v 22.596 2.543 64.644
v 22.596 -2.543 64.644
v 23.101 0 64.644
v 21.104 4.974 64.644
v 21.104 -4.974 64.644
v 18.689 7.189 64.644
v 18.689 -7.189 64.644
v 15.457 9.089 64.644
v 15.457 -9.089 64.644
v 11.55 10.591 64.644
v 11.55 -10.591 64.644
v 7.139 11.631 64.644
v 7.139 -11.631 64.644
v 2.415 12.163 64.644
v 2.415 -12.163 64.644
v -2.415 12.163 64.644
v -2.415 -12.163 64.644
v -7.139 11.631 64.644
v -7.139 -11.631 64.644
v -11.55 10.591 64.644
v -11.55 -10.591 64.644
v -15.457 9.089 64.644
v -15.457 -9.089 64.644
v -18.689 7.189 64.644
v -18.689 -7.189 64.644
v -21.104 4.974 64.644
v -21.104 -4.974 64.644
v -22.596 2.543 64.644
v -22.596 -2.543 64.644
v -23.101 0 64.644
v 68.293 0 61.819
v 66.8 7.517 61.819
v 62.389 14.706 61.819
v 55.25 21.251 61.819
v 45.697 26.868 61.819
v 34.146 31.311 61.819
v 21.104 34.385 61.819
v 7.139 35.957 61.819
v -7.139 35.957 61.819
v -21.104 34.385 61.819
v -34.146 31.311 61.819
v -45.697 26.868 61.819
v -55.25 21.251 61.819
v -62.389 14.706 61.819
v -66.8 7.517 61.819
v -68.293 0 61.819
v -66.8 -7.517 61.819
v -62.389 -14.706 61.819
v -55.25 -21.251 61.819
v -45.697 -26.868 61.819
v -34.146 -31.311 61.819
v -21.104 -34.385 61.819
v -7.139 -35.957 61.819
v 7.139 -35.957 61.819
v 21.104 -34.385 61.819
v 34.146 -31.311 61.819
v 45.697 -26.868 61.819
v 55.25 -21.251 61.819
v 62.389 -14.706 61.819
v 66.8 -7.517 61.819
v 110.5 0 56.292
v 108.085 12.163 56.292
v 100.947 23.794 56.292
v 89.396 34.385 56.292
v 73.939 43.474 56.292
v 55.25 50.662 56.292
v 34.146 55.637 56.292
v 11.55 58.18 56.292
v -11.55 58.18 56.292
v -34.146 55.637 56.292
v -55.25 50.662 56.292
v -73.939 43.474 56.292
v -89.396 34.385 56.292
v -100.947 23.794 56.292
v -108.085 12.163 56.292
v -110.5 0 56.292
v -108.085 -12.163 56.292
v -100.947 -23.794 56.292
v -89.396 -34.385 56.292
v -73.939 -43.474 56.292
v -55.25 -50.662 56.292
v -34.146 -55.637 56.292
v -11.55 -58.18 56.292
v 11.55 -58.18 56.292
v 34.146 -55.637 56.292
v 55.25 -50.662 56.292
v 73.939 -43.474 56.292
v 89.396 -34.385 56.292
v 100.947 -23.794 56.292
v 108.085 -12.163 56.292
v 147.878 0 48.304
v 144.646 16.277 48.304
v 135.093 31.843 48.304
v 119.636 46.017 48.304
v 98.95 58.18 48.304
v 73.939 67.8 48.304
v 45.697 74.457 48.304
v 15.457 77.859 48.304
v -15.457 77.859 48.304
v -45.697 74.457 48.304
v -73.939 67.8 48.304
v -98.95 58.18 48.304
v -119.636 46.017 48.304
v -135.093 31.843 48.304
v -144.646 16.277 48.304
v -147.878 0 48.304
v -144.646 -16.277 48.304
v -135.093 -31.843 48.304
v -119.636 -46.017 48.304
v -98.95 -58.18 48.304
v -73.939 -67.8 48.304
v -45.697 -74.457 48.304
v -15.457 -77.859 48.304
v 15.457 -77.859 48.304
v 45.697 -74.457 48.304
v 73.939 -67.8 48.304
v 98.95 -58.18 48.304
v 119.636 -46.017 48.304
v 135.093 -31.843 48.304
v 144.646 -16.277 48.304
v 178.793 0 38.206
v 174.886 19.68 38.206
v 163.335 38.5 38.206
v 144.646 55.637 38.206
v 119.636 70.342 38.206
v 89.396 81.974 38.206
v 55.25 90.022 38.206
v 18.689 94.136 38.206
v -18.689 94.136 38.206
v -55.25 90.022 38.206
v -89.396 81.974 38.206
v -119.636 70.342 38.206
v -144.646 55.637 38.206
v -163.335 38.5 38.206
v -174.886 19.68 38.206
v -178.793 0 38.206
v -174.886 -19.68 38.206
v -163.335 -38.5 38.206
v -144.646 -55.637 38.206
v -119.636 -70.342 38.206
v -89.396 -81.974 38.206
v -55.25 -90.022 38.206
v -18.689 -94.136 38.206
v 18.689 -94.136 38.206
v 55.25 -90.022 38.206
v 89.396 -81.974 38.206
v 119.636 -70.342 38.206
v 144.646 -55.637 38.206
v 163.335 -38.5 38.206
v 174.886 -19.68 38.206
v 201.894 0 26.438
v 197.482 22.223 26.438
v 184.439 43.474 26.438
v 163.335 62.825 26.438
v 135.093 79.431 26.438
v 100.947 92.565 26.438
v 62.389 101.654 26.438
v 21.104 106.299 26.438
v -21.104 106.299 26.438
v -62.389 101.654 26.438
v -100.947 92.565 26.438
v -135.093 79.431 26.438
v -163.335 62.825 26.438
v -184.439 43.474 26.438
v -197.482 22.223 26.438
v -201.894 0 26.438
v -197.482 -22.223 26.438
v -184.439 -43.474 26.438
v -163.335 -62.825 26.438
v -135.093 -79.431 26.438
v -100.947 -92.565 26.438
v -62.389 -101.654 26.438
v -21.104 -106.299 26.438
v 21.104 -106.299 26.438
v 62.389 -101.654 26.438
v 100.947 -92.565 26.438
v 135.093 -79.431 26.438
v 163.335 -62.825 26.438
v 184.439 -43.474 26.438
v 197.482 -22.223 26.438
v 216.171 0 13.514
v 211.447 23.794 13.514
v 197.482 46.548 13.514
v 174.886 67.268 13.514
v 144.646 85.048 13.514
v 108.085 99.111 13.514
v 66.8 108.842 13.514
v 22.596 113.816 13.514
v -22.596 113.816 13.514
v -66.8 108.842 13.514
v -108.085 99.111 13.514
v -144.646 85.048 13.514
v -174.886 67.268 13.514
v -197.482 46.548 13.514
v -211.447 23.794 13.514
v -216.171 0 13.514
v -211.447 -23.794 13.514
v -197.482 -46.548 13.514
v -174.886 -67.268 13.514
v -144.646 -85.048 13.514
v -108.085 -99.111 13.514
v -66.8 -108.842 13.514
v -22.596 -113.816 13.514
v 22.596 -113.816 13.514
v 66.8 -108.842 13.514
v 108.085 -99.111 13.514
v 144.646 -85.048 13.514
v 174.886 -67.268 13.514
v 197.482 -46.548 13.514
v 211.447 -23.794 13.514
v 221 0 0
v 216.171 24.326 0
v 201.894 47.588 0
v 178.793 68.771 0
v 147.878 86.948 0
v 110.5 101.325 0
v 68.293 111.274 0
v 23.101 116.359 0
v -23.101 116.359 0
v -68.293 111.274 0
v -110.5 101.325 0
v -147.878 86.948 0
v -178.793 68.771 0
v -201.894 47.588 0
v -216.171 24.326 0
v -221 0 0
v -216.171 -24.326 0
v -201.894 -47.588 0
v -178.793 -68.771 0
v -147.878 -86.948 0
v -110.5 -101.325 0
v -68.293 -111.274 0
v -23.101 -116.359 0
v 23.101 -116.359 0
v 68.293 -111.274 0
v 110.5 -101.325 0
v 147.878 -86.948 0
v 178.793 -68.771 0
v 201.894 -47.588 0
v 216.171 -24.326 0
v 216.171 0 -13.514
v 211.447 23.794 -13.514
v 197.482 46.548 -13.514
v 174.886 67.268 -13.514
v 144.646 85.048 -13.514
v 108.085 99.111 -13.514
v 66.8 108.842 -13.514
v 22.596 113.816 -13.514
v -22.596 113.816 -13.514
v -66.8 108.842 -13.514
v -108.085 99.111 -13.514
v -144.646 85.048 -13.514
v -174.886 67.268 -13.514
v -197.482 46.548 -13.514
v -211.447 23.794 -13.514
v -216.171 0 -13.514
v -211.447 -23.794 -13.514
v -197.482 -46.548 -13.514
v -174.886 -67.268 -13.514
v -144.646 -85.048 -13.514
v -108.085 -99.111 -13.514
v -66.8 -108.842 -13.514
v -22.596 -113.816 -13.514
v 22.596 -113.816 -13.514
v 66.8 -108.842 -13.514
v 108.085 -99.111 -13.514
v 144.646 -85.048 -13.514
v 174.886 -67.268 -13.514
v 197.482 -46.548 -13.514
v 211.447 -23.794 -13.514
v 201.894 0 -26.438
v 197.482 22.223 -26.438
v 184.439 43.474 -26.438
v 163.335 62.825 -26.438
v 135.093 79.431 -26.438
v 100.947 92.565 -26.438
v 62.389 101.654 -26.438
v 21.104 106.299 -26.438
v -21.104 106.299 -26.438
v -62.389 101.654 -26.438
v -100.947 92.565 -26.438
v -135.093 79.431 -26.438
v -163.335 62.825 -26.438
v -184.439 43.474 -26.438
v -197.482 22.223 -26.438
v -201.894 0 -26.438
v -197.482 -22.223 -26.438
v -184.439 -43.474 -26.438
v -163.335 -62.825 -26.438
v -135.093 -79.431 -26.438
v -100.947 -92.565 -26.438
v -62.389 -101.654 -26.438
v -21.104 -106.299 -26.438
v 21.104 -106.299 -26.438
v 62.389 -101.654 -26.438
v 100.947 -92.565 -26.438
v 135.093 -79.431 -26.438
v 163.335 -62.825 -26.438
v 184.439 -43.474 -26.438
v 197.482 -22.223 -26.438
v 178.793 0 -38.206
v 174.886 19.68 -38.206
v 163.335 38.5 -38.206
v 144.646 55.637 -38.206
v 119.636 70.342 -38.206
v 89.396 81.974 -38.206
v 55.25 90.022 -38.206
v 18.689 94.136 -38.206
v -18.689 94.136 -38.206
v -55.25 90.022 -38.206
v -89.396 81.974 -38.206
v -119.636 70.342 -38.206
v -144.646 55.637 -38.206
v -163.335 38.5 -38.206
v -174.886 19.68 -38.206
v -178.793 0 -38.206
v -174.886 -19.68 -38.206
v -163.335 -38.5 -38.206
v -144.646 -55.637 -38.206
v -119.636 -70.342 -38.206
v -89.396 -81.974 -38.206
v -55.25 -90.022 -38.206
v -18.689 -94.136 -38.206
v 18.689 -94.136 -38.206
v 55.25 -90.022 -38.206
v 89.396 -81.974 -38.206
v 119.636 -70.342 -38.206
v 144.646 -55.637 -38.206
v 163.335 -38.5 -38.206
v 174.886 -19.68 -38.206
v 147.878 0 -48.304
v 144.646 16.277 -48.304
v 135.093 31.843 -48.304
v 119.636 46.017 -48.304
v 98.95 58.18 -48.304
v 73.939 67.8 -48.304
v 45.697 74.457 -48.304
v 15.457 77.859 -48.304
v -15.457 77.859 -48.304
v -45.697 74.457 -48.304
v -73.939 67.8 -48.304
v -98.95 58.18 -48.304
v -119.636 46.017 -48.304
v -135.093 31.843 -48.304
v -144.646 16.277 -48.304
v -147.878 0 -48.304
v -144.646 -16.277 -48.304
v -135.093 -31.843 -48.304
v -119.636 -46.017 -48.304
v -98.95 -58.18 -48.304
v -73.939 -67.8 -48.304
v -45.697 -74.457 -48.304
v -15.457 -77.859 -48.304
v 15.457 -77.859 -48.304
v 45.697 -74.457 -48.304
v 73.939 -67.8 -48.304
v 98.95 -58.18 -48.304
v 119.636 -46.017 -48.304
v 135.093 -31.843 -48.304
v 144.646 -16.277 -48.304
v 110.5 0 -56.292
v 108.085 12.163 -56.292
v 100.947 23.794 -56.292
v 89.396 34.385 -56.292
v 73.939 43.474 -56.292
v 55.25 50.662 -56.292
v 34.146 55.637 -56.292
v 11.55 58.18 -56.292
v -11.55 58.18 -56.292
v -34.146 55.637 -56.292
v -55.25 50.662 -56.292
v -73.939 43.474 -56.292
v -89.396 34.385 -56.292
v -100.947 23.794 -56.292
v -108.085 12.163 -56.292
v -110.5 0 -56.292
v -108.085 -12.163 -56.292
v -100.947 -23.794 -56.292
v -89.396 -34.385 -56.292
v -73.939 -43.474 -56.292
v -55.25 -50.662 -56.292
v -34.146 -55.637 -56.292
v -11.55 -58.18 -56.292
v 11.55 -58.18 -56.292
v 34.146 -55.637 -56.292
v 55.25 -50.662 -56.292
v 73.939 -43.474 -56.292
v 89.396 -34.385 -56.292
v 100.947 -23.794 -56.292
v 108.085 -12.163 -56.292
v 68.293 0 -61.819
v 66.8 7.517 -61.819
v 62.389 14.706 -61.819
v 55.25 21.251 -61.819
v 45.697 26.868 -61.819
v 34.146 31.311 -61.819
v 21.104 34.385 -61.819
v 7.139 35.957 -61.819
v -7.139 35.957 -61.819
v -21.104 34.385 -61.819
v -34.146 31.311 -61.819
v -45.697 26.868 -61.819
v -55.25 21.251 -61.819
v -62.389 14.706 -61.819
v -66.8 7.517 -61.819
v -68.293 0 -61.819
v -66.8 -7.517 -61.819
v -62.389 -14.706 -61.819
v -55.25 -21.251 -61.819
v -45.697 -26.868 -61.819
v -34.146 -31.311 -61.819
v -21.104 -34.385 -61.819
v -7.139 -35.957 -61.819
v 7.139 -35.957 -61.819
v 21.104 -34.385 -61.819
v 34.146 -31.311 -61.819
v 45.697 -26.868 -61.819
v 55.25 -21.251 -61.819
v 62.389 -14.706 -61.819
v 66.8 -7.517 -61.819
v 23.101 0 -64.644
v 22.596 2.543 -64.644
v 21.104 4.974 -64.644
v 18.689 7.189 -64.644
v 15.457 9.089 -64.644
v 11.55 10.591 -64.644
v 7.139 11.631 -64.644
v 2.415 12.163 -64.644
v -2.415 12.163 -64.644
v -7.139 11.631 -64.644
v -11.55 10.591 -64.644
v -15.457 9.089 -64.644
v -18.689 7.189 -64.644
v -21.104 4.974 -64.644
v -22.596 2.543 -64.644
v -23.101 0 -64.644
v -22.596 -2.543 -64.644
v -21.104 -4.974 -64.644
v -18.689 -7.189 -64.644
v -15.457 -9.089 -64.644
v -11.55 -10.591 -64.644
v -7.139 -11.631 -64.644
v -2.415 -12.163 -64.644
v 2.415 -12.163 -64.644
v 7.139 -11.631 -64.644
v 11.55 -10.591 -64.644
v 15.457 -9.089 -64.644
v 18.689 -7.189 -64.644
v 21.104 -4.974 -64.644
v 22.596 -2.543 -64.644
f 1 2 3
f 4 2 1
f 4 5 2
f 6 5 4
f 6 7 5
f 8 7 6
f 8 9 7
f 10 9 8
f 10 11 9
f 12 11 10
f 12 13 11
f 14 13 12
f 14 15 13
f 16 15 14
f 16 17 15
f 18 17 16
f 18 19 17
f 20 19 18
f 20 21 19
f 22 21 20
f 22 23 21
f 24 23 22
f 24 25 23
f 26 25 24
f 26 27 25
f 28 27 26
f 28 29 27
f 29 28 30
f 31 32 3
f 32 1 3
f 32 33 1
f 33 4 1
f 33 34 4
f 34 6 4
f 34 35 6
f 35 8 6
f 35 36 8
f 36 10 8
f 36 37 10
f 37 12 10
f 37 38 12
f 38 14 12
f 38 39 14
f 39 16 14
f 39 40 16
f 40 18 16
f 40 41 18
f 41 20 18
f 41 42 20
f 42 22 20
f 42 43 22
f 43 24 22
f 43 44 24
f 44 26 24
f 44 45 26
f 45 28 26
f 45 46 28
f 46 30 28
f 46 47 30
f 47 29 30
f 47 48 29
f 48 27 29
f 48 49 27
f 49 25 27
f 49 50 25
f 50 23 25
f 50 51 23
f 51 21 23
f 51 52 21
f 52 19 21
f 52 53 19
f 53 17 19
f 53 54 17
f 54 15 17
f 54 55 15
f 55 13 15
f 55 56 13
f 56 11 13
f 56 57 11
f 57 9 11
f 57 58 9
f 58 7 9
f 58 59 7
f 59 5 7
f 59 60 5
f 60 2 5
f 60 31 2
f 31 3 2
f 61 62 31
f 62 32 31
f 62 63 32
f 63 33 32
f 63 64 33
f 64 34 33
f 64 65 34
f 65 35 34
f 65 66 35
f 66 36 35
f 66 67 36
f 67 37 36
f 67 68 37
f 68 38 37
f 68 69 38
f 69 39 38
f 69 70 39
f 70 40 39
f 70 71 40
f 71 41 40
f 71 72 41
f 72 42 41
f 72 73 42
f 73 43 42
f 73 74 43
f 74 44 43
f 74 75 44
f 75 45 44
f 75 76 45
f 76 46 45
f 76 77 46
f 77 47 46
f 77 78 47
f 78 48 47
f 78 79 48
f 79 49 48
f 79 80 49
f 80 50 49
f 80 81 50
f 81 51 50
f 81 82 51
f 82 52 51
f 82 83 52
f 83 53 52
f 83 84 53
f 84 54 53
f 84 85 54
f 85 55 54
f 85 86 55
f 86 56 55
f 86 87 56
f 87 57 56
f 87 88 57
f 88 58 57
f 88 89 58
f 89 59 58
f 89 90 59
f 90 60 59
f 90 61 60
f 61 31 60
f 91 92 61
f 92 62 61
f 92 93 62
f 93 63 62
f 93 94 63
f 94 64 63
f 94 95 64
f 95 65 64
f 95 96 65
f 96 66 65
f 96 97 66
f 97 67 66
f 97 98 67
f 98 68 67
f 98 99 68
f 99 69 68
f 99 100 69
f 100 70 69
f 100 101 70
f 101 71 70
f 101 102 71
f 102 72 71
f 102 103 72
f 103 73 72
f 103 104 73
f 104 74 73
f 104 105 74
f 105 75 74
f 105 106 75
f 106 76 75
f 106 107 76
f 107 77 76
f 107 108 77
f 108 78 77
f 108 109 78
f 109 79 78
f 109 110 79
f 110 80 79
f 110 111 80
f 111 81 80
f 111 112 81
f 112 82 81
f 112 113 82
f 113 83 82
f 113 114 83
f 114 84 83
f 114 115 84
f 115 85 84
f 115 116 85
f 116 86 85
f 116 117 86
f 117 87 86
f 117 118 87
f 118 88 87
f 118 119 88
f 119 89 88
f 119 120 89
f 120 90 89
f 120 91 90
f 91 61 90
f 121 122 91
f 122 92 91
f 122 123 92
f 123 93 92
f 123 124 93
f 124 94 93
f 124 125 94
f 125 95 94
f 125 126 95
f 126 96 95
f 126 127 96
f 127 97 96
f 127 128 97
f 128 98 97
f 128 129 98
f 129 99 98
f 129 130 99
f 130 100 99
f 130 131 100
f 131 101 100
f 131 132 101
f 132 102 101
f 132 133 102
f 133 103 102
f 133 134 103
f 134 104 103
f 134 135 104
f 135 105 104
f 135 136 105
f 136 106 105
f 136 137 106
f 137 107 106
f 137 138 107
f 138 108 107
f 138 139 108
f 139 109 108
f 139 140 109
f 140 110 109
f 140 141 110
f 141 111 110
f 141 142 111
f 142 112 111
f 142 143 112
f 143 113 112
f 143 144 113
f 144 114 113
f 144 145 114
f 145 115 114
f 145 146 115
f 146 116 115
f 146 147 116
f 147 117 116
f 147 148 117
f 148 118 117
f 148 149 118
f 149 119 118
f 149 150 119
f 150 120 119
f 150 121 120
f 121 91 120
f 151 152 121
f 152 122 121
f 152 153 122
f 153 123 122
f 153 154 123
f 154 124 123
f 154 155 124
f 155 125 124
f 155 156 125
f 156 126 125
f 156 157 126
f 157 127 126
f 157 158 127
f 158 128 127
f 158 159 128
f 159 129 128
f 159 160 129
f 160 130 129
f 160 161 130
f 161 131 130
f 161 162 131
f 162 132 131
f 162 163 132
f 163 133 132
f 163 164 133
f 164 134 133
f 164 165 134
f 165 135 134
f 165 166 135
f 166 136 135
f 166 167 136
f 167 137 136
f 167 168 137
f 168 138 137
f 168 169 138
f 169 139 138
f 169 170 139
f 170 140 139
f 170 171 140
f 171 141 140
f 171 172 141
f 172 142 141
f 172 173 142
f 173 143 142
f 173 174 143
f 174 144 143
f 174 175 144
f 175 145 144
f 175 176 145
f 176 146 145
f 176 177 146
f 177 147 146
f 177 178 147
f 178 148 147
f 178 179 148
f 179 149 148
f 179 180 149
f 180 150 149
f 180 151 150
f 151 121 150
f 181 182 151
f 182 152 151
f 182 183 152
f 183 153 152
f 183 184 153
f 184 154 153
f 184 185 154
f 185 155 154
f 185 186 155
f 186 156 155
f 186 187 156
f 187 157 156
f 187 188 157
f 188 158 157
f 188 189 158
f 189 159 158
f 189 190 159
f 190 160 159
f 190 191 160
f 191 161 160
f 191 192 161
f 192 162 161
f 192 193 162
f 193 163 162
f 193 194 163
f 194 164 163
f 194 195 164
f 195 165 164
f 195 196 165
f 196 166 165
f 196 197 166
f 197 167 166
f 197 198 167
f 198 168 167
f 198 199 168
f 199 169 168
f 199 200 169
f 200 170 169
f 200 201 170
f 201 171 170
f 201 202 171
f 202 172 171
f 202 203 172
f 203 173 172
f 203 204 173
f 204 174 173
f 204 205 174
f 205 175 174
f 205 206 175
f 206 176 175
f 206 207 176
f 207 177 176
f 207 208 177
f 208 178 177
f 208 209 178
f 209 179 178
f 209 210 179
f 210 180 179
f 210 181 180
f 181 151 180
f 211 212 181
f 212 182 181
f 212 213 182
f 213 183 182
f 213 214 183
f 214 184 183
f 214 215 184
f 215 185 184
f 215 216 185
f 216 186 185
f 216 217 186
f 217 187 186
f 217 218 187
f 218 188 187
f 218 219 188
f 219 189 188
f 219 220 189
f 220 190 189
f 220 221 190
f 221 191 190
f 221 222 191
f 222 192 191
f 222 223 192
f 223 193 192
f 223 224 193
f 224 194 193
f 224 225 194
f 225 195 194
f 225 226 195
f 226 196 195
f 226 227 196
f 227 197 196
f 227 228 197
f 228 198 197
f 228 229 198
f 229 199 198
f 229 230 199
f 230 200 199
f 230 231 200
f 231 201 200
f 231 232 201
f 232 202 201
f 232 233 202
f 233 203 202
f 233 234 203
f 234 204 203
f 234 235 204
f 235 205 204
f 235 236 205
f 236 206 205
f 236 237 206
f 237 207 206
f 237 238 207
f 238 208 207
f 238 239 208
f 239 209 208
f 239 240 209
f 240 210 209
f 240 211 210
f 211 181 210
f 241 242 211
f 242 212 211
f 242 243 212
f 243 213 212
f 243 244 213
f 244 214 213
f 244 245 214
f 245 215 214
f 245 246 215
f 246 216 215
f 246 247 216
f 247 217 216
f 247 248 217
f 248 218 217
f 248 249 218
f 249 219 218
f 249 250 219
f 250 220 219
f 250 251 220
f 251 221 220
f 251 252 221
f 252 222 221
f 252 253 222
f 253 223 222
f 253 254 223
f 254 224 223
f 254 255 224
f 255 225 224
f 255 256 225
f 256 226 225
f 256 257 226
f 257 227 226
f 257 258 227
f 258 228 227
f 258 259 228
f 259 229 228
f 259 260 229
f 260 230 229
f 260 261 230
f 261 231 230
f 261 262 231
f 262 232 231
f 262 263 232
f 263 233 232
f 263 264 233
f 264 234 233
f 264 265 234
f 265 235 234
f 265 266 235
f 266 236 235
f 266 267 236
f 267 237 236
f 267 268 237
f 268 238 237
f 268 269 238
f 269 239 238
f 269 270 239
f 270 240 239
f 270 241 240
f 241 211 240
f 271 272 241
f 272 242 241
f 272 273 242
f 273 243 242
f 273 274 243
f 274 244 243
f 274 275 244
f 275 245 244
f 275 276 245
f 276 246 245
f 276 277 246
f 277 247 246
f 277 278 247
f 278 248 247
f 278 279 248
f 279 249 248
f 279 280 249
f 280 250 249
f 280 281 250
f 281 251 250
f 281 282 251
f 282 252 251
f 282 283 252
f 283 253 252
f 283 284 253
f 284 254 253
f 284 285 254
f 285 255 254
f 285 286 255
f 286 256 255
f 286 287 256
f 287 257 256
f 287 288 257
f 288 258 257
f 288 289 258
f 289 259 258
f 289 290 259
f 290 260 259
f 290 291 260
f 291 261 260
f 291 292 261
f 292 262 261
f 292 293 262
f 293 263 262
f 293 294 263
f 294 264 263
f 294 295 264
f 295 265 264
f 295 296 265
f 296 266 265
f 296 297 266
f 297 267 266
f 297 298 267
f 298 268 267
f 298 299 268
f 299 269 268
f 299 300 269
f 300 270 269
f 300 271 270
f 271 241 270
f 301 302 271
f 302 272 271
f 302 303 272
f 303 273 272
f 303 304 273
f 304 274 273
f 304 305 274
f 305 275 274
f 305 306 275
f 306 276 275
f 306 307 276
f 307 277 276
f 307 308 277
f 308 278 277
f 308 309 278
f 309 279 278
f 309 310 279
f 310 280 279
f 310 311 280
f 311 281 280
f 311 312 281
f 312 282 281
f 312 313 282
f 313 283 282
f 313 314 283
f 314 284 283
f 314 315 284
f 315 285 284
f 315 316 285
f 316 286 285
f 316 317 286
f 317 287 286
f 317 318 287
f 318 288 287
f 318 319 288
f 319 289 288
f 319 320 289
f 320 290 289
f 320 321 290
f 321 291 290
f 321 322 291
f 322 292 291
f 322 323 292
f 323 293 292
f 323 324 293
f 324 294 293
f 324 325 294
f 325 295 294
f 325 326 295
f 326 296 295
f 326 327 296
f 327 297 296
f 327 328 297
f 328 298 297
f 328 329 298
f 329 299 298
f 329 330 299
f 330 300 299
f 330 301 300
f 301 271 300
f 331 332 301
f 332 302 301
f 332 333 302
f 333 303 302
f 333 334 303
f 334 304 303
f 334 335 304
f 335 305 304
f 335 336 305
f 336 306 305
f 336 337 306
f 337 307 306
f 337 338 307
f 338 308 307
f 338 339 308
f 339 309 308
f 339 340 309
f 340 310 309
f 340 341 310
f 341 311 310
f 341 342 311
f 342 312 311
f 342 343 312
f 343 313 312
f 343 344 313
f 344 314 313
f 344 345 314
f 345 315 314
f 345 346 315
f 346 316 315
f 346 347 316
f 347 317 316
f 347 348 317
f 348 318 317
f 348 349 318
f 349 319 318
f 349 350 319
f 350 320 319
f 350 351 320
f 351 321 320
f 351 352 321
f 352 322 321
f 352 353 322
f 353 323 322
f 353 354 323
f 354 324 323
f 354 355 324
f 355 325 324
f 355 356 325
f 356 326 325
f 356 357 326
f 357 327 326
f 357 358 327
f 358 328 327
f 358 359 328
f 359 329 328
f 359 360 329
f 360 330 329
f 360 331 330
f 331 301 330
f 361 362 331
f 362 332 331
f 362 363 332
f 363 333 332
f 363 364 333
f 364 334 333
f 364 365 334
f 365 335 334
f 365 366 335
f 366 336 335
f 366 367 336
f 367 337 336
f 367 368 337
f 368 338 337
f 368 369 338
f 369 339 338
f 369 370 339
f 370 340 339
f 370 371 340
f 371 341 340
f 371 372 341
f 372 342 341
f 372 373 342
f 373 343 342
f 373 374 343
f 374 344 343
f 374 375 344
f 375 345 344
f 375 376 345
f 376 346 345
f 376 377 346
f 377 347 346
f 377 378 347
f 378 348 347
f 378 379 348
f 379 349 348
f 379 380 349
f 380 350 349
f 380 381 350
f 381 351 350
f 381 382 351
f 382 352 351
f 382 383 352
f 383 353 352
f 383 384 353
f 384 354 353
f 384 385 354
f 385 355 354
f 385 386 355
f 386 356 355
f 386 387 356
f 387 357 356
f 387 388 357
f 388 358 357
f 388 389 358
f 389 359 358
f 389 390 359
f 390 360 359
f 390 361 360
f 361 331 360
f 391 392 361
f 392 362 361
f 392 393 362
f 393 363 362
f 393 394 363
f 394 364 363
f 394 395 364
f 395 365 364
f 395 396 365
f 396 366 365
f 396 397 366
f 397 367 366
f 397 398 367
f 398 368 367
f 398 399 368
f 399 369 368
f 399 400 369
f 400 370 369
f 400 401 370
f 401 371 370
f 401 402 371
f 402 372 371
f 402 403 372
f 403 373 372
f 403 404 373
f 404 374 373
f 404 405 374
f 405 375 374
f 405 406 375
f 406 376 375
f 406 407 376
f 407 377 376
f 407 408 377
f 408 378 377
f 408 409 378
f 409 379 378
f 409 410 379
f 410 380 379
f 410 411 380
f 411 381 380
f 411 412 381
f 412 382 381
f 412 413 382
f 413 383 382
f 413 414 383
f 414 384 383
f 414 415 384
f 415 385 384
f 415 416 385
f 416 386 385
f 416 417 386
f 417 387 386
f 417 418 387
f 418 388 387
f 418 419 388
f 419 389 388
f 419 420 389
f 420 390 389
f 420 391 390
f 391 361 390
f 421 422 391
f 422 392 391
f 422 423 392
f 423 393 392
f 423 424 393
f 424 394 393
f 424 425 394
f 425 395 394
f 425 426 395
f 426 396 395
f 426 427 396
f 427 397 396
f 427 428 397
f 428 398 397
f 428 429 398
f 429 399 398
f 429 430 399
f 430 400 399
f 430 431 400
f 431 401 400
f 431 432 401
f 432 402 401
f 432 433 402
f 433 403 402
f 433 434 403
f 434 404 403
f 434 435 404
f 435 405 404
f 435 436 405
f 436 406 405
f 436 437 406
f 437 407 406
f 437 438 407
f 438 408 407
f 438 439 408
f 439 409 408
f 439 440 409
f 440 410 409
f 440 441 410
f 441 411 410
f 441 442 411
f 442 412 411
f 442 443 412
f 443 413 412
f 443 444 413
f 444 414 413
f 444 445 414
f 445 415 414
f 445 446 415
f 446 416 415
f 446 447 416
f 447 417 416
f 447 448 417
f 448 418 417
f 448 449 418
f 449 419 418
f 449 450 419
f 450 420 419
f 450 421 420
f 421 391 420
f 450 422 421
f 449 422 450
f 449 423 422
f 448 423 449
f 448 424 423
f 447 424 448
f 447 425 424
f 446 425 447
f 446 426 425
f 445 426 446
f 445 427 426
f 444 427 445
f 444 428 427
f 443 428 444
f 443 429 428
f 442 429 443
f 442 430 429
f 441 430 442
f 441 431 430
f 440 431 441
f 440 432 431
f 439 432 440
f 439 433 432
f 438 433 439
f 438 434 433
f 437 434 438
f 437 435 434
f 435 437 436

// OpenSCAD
// Generated by SolidPython 1.0.1 on 2020-07-29 00:46:53


scale(v = [17, 9, 5]) {
	sphere(r = 13);
}
/***********************************************
*********      SolidPython code:      **********
************************************************
 
# import packages: SolidPython
from solid import *
from solid.utils import *
from itertools import chain, combinations, permutations


class Resize:

    def __init__(self, scad_file):
        self.scad_file = scad_file
        #self.scad_file = import_scad(scad_file)
        # cone/cylinder param:
        self.r1 = 0
        self.r2 = 0
        self.h = 0
        # rectangular prism param:
        self.w = 0
        self.l = 0
        # ellipse param:
        self.r = 0

    # import OpenScad code (file name corresponds to shape)


    # classify shape + parameters
    def assign(self, param1, param2, param3):
        if self.scad_file == 'cone.scad':
            self.r1 = param1
            self.r2 = param2
            self.h = param3
        elif self.scad_file == 'cylinder.scad':
            self.r1 = param1
            self.r2 = param2
            self.h = param3
        elif self.scad_file == 'rectangularPrism.scad':
            self.h = param1
            self.l = param2
            self.w = param3
        else:
            self.r = param1
            self.h = param2

    # resize parameters
    def iterate(self):
        x = range(3, 20, 2)
        i = 1
        if self.scad_file == 'cone.scad':
            tempList = list(permutations(x, 2))
            for temp in tempList:
                param1 = temp[0]
                param2 = temp[1]
                filepath = 'produced_scad_files/' + 'cone' + str(param1) + '_' + str(param2) + '_' + '.scad'
                scad_render_to_file(cylinder(h=param1, r1=param2, r2=0), filepath)

        elif self.scad_file == 'cylinder.scad':
            tempList = list(permutations(x, 3))
            for temp in tempList:
                param1 = temp[0]
                param2 = temp[1]
                filepath = 'produced_scad_files/' + 'cylinder' + str(param1) + '_' + str(param2) + '_' + '.scad'
                scad_render_to_file(cylinder(h=param1, r1=param2, r2=param2), filepath)

        elif self.scad_file == 'rectangularPrism.scad':
            tempList = list(permutations(x, 3))
            for temp in tempList:
                param1 = temp[0]
                param2 = temp[1]
                param3 = temp[2]
                filepath = 'produced_scad_files/' + 'rectangularPrism' + str(param1) + '_' + str(param2) + '_' + str(
                    param3) + '.scad'
                scad_render_to_file(cube(size=(param1, param2, param3)), filepath)

        elif self.scad_file == 'ellipse.scad':
            tempList = list(permutations(x, 4))
            for temp in tempList:
                param1 = temp[0]
                param2 = temp[1]
                param3 = temp[2]
                param4 = temp[3]
                filepath = 'produced_scad_files/' + 'ellipse' + str(param1) + '_' + str(param2) + '_' + str(param3) + '_' + str(param4) + '.scad'
                scad_render_to_file(scale([param1, param2, param3])(sphere(r=param4)), filepath)

    def render_to_scadfile(self):
        scad_render_to_file(scad, 'example.scad') 
 
************************************************/
